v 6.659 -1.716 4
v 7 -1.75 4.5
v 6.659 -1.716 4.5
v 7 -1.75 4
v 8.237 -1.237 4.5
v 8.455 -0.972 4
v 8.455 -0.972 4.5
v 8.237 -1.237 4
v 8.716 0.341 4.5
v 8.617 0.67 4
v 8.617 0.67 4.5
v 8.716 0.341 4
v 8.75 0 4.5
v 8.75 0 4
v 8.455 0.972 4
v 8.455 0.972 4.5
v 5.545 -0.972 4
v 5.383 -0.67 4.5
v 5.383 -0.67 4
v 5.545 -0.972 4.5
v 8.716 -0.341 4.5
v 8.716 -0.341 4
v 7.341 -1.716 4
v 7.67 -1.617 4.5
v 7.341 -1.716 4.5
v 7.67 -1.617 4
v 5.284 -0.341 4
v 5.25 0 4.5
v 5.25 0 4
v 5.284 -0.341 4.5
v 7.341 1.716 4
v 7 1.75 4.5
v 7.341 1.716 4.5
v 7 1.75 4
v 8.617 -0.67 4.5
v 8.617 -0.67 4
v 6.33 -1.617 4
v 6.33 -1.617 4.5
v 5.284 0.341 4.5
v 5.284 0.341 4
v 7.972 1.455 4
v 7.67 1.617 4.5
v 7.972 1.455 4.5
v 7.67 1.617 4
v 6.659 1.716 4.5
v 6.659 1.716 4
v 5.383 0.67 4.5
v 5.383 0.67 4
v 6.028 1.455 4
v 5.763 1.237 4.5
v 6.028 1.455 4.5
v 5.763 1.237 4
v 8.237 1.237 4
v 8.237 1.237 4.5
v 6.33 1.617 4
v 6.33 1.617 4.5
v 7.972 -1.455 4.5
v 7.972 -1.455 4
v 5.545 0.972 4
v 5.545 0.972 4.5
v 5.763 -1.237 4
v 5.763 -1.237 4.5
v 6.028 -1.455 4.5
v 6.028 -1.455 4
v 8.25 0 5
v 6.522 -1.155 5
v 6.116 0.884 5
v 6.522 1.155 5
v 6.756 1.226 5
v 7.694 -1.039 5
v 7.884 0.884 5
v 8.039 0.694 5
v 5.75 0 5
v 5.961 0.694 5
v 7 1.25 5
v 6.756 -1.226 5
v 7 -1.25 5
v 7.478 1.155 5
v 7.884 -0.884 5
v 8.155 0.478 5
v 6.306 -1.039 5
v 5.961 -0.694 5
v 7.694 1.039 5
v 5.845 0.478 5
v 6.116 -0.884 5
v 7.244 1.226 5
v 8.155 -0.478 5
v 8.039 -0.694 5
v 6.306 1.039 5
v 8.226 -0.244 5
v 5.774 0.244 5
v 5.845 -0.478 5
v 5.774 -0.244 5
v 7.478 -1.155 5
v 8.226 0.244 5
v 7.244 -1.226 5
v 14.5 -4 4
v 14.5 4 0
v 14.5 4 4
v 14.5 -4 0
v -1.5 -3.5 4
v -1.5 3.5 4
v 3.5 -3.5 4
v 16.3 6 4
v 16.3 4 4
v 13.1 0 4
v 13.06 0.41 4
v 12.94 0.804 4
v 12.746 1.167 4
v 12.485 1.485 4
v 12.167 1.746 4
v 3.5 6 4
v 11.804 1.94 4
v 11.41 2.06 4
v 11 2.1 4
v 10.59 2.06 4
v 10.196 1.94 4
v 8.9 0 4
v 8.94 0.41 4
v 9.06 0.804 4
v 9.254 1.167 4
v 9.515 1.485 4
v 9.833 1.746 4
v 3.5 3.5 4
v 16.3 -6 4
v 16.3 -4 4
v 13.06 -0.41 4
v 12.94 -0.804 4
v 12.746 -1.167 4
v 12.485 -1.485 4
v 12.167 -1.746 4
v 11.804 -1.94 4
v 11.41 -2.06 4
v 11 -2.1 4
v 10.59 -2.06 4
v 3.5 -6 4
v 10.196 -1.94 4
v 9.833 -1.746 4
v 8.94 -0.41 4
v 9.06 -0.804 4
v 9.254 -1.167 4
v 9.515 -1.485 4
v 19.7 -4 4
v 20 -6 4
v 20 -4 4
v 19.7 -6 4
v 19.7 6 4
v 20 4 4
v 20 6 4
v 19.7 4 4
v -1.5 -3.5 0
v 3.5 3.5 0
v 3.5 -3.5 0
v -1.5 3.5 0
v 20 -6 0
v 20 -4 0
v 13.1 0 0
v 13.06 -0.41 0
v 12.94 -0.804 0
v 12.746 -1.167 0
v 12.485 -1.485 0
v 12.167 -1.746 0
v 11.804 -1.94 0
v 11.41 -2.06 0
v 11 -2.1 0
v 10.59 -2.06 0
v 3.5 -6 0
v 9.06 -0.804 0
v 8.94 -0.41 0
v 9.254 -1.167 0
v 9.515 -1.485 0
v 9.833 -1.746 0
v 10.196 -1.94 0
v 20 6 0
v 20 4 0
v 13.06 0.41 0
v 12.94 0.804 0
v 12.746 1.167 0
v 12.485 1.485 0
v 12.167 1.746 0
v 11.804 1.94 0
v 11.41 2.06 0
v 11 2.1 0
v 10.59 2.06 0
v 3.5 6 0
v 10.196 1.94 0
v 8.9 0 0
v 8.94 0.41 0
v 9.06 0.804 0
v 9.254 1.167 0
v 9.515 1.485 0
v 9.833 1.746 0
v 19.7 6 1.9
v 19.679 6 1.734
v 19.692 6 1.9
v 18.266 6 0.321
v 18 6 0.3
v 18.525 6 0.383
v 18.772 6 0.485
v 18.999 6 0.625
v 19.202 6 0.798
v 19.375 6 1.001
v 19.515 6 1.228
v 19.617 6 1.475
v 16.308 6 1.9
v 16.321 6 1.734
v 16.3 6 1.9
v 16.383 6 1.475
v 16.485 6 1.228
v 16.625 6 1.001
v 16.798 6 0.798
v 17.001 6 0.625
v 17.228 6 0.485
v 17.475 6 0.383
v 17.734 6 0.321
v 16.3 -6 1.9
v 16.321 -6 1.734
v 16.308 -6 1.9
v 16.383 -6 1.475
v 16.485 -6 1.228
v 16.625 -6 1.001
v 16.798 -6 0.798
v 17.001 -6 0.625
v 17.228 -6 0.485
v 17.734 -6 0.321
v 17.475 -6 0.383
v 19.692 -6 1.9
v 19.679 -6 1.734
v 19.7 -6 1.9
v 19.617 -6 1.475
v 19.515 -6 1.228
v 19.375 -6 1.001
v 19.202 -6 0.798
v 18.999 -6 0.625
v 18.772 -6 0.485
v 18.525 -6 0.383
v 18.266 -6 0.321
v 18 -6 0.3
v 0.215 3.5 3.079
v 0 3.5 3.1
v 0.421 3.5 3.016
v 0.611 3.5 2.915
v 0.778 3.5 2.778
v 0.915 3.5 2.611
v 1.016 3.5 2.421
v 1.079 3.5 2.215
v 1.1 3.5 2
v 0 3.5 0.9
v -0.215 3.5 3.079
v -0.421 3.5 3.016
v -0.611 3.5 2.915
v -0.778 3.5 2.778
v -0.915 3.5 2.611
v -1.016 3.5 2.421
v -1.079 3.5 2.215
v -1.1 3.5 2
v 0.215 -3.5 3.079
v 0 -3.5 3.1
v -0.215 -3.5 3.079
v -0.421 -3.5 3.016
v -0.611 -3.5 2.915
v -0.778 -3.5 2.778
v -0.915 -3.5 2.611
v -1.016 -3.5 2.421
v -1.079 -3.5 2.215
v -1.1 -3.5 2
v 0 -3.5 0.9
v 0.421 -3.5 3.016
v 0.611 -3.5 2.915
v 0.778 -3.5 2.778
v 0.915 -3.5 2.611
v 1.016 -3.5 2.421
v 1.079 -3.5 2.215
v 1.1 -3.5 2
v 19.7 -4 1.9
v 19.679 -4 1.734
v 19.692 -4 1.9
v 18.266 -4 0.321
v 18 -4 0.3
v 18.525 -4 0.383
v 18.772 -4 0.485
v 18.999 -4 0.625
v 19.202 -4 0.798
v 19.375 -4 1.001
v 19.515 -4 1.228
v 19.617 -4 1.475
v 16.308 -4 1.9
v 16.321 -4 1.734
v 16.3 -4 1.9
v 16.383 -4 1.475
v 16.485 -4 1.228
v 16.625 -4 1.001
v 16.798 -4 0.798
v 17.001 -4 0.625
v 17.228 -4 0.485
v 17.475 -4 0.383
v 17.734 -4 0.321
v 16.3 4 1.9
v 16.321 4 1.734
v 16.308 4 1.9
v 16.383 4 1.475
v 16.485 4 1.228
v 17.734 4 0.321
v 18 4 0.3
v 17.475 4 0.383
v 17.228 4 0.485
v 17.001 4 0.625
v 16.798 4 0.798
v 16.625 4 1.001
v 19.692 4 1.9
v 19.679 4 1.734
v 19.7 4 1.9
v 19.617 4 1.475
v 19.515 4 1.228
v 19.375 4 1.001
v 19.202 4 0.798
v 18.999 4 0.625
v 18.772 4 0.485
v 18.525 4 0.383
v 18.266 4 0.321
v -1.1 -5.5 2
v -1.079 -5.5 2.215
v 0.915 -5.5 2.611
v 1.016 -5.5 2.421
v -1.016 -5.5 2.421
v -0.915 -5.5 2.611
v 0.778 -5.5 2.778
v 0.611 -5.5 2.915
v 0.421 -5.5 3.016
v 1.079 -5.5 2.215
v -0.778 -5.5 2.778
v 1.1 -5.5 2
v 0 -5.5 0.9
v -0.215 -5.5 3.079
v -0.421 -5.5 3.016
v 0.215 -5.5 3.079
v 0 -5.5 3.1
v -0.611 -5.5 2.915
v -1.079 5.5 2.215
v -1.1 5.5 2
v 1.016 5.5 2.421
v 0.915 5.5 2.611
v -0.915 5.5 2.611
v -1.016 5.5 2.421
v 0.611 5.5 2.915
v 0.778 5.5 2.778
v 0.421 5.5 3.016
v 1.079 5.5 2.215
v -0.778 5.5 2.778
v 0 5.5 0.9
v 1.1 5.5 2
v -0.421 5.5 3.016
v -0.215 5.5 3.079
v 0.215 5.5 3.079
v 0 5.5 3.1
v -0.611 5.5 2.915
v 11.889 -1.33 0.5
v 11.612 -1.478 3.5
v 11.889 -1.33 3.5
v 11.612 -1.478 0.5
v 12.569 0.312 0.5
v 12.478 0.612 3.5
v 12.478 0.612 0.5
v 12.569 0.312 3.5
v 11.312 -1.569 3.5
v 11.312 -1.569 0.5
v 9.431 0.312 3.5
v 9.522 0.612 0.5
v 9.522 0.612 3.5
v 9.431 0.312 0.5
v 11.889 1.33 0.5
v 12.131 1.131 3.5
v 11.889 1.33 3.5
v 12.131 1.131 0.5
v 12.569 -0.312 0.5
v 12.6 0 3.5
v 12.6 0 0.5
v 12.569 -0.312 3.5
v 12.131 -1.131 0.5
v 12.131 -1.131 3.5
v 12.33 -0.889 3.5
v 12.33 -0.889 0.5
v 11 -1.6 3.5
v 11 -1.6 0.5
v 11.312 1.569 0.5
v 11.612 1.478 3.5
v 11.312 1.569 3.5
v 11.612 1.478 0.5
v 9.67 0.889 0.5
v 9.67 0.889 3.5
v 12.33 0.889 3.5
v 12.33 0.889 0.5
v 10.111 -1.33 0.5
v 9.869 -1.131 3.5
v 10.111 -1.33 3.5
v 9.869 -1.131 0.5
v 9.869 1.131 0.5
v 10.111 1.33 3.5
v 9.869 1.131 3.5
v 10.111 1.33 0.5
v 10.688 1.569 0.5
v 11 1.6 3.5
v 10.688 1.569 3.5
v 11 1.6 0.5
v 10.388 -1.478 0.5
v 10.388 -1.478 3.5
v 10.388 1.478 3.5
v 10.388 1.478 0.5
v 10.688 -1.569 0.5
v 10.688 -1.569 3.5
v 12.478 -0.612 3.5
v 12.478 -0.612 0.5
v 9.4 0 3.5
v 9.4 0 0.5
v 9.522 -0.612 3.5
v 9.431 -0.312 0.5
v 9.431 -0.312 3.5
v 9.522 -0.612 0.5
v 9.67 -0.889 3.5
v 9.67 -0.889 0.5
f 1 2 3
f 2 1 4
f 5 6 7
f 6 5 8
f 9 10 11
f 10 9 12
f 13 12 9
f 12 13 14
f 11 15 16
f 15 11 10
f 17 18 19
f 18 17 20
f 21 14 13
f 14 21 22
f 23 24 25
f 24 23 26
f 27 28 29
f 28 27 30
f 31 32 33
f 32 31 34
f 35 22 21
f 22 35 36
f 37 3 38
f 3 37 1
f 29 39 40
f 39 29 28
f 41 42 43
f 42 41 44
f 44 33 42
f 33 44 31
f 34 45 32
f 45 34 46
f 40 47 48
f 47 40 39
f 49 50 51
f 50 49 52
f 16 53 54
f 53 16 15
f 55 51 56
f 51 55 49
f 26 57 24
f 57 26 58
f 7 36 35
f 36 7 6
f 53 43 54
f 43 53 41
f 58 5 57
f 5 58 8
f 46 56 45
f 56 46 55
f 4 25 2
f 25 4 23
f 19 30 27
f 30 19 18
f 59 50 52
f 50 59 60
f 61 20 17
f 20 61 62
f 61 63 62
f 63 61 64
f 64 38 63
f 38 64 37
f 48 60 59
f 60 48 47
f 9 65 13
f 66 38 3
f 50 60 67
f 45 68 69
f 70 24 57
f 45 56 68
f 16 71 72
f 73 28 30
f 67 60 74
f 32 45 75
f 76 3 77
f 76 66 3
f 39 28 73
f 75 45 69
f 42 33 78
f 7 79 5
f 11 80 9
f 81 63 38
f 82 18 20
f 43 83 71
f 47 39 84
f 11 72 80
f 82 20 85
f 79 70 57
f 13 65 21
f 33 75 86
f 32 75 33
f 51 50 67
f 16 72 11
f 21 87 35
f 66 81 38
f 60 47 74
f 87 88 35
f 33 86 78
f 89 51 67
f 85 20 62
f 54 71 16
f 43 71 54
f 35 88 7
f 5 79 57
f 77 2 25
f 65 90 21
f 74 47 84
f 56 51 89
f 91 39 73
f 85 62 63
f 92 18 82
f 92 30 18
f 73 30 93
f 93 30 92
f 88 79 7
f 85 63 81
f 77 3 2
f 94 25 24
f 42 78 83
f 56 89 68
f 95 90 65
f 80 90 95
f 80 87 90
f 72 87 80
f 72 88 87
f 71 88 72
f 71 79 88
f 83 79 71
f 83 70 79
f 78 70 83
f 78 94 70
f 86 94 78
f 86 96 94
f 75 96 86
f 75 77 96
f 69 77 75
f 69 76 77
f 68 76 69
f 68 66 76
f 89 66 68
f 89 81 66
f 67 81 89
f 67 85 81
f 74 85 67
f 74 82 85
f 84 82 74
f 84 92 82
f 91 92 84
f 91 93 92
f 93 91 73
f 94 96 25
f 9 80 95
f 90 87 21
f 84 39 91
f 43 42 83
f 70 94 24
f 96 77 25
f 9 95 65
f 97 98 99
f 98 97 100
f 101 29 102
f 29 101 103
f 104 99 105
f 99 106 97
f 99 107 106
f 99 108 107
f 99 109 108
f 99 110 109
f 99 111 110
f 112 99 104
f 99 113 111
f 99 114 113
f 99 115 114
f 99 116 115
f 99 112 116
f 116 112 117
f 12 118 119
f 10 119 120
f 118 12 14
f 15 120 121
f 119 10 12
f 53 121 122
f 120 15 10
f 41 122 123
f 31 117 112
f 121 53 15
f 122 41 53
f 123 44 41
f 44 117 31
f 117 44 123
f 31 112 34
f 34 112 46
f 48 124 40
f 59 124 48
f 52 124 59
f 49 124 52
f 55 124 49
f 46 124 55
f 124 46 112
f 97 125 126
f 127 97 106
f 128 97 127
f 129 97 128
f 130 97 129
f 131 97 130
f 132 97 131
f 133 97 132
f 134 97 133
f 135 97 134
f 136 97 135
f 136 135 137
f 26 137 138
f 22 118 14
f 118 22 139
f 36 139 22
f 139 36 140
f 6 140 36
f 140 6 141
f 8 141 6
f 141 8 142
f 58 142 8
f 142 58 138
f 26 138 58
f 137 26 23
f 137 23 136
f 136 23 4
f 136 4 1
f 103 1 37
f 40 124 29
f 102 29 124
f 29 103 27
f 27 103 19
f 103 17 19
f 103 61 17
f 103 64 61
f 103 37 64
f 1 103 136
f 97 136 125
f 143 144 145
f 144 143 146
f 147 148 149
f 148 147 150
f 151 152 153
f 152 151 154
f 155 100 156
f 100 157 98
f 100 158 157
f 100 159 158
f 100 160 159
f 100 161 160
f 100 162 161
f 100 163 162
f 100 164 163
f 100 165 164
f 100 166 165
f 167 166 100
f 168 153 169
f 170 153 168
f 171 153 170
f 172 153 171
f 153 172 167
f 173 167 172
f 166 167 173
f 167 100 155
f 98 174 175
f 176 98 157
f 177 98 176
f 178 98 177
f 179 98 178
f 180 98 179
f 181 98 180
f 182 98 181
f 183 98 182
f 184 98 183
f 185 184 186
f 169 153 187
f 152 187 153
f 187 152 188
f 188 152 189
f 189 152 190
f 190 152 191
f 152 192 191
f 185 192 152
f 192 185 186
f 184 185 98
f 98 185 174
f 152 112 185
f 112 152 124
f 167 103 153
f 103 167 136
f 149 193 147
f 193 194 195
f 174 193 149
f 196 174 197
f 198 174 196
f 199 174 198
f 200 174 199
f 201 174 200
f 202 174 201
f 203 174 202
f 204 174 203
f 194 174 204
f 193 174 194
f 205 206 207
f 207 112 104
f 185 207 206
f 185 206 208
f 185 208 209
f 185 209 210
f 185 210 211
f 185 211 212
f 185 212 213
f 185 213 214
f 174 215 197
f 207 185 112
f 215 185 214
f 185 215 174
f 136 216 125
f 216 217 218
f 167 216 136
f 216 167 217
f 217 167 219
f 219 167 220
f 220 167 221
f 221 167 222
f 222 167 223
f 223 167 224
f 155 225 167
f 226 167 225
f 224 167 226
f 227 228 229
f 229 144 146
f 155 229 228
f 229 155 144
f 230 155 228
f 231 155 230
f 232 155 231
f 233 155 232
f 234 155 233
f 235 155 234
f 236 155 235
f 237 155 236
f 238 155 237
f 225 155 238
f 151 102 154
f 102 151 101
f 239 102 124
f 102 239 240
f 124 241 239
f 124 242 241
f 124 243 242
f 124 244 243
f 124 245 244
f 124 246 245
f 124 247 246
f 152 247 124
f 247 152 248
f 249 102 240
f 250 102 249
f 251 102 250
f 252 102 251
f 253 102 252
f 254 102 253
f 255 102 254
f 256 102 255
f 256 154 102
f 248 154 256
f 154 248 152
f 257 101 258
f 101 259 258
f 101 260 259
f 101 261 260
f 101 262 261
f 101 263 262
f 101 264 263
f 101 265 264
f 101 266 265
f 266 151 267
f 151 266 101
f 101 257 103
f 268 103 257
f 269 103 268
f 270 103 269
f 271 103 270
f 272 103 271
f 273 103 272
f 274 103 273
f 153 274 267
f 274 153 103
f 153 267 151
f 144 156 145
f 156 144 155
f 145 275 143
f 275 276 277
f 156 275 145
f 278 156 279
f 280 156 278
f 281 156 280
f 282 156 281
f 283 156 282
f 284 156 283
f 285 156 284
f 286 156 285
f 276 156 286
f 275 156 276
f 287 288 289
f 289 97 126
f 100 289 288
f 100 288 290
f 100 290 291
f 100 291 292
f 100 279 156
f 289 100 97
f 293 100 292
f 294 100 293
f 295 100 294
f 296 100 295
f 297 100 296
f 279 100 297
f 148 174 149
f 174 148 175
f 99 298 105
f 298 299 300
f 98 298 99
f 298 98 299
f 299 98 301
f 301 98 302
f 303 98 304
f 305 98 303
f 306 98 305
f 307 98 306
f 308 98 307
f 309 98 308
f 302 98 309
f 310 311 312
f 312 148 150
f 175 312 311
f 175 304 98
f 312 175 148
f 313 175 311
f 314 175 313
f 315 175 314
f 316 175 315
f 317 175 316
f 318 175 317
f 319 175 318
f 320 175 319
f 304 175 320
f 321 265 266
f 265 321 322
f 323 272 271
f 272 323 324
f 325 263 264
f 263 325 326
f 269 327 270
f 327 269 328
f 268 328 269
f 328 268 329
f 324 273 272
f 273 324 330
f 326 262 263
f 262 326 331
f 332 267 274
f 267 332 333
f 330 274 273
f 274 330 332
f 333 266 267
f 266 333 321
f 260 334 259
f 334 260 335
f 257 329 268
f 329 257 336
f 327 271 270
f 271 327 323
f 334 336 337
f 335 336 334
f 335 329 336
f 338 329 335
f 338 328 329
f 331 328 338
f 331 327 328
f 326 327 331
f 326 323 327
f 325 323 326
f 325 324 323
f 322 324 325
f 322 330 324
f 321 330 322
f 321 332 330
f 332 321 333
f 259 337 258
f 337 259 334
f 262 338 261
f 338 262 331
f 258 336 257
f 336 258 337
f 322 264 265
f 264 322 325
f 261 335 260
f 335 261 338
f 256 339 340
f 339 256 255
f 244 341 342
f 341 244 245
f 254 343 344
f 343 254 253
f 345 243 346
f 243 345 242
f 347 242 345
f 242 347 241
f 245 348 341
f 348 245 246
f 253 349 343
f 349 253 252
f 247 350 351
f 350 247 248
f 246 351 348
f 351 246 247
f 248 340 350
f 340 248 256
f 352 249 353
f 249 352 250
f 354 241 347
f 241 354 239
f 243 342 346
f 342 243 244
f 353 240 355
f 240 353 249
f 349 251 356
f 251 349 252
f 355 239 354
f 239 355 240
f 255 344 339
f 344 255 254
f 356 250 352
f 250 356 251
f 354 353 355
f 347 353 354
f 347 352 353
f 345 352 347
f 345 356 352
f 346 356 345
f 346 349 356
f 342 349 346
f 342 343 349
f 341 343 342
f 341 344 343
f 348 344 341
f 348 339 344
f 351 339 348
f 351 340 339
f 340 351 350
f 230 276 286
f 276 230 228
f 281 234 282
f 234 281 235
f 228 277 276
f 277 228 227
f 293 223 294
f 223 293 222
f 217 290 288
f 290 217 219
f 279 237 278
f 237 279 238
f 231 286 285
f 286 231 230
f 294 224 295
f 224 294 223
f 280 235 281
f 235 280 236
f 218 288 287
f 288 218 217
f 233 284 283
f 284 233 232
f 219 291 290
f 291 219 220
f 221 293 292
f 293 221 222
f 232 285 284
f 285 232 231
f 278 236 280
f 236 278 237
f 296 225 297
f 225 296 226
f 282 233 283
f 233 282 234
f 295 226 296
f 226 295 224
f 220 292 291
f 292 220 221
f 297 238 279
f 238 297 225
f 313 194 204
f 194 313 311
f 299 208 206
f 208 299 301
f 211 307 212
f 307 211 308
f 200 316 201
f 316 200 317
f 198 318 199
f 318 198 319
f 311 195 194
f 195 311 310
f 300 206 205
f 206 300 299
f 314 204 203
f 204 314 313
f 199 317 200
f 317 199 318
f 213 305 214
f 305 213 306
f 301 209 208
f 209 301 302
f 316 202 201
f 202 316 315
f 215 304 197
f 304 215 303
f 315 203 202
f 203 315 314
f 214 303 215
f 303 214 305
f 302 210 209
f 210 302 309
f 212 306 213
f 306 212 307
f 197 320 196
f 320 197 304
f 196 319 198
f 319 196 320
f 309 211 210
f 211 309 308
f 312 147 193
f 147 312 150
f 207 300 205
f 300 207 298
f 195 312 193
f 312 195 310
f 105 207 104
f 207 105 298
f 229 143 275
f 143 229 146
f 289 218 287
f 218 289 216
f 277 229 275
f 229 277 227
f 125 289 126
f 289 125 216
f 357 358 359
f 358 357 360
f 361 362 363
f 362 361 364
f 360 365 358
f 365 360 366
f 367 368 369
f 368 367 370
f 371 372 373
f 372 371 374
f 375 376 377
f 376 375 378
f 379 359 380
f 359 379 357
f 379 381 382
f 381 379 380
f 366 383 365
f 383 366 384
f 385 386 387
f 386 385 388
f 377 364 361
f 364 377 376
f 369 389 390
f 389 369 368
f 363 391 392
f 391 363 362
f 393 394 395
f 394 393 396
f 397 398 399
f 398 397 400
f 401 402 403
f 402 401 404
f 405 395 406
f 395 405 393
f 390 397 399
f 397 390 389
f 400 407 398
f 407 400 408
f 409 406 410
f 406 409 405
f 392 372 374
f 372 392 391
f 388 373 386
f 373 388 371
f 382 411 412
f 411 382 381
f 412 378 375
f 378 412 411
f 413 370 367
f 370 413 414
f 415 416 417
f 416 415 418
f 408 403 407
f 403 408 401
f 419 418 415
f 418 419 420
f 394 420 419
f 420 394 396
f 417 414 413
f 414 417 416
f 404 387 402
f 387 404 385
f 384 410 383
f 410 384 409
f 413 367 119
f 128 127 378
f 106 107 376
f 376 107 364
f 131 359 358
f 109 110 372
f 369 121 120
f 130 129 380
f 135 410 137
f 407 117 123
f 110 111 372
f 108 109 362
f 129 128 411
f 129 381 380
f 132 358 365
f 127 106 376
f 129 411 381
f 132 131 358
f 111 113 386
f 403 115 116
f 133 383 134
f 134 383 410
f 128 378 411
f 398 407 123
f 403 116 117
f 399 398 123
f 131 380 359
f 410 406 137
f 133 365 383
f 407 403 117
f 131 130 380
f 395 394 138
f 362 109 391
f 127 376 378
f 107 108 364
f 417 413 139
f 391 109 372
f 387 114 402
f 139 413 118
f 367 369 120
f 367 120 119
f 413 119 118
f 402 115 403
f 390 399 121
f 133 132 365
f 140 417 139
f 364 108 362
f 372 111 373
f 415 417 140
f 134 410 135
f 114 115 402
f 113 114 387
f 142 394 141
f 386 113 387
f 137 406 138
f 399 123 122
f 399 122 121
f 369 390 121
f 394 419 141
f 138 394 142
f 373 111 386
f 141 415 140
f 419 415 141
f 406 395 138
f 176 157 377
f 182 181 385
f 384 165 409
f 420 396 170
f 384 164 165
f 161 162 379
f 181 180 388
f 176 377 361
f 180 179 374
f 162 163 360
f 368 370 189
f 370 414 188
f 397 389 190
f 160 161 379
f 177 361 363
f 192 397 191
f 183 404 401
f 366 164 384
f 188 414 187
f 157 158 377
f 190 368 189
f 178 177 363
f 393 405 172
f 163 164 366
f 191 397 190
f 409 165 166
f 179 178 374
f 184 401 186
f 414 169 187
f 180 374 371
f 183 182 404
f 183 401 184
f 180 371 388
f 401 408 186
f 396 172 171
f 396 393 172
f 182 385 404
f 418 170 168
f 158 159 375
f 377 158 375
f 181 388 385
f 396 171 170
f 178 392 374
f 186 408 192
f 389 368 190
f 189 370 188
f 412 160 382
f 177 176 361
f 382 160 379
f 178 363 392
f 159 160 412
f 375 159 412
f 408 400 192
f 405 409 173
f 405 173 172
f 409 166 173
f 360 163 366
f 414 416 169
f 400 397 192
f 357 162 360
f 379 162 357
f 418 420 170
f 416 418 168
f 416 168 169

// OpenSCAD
// Bracelet of hinged links, printed in place (3-link sample of a 10-link chain)
part = "link"; // [link, assembly]
cadverify_only = "";
module instance(name, part, unit = 1) {
    echo(cadverify_instance = [name, part, unit]);
    if (cadverify_only == "" || cadverify_only == name) children();
}
// link: pitch 18 (X), width 12 (Y), body 4 thick + 1 snap stud = 5
// hinge: teardrop pin (r1.1) in U-cradle (r1.7, open at top), 0.6 clearance
P = 18; W = 12; Zc = 2.0;
Rp = 1.1; Rh = 1.7; SlotH = 1.7;
Ytong = 3.5;
Xrear = -1.5; Xsr = 3.5; Xsf = 14.5; Xlr = 13.5; Xfront = 20;
XpinF = 18;
studX = 7; studR = 1.75;
holeX = 11; holeR = 1.6;
module teardrop2D() {
    pts = concat([for (a=[0:180/16:180]) [Rp*cos(a), Zc+Rp*sin(a)]], [[0, Zc-Rp]]);
    polygon(pts);
}
module pin_stub(len) { linear_extrude(height=len) teardrop2D(); }
module stud_solid() {
    translate([studX, 0, 3.9]) cylinder(r=studR, h=0.6, $fn=32);
    translate([studX, 0, 4.5]) cylinder(r1=studR, r2=1.25, h=0.5, $fn=32);
}
module link() {
    difference() {
        union() {
            translate([Xsr, -6, 0]) cube([Xsf-Xsr, 12, 4]);
            translate([Xrear, -Ytong, 0]) cube([(4.5-Xrear), 7, 4]);
            translate([Xlr, -6, 0]) cube([Xfront-Xlr, 2, 4]);
            translate([Xlr, 4, 0]) cube([Xfront-Xlr, 2, 4]);
            translate([0, -2.5, 0]) rotate([90,0,0]) pin_stub(3.0);
            translate([0, 5.5, 0]) rotate([90,0,0]) pin_stub(3.0);
            stud_solid();
        }
        translate([XpinF, -6.1, Zc]) rotate([-90,0,0]) cylinder(r=Rh, h=2.2, $fn=40);
        translate([XpinF, 3.9, Zc]) rotate([-90,0,0]) cylinder(r=Rh, h=2.2, $fn=40);
        // drop-in slots: knuckles open at top, links land from above
        translate([XpinF-SlotH, 3.9, 1.9]) cube([2*SlotH, 2.2, 2.2]);
        translate([XpinF-SlotH, -6.1, 1.9]) cube([2*SlotH, 2.2, 2.2]);
        translate([holeX, 0, -0.1]) cylinder(r=holeR, h=4.2, $fn=32);
        translate([holeX, 0, 3.5]) cylinder(r1=holeR, r2=2.1, h=0.5, $fn=32);
        translate([holeX, 0, 0]) cylinder(r1=2.1, r2=holeR, h=0.5, $fn=32);
    }
}
if (part == "assembly") {
    echo(cadverify_spec = [
        ["bounds", [[-1.5, -6, 0], [56, 6, 5]]],
        ["support_faces", [["bed", "-z", 300]]],
        ["allowed_interferences", []],
        ["motions", [["joint_bend", ["link3"], "rotate", [36, 0, 2], [0, 1, 0], [-30, 30]]]],
        ["assembly_order", [[["link1"], [0, 0, 0]], [["link2"], [0, 0, -1]], [["link3"], [0, 0, -1]]]],
        ["print_in_place", 0.5],
        ["overhangs_allowed", []]
    ]);
    instance("link1", "link", 1) translate([0, 0, 0]) link();
    instance("link2", "link", 1) translate([18, 0, 0]) link();
    instance("link3", "link", 1) translate([36, 0, 0]) link();
} else {
    echo(cadverify_spec = [
        ["bounds", [[-1.5, -6, 0], [20, 6, 5]]],
        ["bodies", 1],
        ["through_holes", 3],
        ["support_faces", [["bed", "-z", 100]]],
        ["overhangs_allowed", []],
        ["copies", 3],
        ["details", [
            ["spine", "material", [[5, -5, 0], [9, 5, 4]], 0.9],
            ["slot", "void", [[14.5, -4, 0], [20, 4, 4]], 0.9],
            ["pin_hole", "hole", [18, -8, 2], [0, 1, 0], [[0, 3.4], [1, 3.4]]],
            ["snap_hole", "hole", [11, 0, 6], [0, 0, -1], [[0, 4.2], [0.5, 3.2], [3.5, 3.2]]],
            ["floor", "thickness", [9, 3, -1], [0, 0, 1], 4],
            ["snap", "view", [[5, -2, 4], [9, 2, 5]]]
        ]]
    ]);
    link();
}
